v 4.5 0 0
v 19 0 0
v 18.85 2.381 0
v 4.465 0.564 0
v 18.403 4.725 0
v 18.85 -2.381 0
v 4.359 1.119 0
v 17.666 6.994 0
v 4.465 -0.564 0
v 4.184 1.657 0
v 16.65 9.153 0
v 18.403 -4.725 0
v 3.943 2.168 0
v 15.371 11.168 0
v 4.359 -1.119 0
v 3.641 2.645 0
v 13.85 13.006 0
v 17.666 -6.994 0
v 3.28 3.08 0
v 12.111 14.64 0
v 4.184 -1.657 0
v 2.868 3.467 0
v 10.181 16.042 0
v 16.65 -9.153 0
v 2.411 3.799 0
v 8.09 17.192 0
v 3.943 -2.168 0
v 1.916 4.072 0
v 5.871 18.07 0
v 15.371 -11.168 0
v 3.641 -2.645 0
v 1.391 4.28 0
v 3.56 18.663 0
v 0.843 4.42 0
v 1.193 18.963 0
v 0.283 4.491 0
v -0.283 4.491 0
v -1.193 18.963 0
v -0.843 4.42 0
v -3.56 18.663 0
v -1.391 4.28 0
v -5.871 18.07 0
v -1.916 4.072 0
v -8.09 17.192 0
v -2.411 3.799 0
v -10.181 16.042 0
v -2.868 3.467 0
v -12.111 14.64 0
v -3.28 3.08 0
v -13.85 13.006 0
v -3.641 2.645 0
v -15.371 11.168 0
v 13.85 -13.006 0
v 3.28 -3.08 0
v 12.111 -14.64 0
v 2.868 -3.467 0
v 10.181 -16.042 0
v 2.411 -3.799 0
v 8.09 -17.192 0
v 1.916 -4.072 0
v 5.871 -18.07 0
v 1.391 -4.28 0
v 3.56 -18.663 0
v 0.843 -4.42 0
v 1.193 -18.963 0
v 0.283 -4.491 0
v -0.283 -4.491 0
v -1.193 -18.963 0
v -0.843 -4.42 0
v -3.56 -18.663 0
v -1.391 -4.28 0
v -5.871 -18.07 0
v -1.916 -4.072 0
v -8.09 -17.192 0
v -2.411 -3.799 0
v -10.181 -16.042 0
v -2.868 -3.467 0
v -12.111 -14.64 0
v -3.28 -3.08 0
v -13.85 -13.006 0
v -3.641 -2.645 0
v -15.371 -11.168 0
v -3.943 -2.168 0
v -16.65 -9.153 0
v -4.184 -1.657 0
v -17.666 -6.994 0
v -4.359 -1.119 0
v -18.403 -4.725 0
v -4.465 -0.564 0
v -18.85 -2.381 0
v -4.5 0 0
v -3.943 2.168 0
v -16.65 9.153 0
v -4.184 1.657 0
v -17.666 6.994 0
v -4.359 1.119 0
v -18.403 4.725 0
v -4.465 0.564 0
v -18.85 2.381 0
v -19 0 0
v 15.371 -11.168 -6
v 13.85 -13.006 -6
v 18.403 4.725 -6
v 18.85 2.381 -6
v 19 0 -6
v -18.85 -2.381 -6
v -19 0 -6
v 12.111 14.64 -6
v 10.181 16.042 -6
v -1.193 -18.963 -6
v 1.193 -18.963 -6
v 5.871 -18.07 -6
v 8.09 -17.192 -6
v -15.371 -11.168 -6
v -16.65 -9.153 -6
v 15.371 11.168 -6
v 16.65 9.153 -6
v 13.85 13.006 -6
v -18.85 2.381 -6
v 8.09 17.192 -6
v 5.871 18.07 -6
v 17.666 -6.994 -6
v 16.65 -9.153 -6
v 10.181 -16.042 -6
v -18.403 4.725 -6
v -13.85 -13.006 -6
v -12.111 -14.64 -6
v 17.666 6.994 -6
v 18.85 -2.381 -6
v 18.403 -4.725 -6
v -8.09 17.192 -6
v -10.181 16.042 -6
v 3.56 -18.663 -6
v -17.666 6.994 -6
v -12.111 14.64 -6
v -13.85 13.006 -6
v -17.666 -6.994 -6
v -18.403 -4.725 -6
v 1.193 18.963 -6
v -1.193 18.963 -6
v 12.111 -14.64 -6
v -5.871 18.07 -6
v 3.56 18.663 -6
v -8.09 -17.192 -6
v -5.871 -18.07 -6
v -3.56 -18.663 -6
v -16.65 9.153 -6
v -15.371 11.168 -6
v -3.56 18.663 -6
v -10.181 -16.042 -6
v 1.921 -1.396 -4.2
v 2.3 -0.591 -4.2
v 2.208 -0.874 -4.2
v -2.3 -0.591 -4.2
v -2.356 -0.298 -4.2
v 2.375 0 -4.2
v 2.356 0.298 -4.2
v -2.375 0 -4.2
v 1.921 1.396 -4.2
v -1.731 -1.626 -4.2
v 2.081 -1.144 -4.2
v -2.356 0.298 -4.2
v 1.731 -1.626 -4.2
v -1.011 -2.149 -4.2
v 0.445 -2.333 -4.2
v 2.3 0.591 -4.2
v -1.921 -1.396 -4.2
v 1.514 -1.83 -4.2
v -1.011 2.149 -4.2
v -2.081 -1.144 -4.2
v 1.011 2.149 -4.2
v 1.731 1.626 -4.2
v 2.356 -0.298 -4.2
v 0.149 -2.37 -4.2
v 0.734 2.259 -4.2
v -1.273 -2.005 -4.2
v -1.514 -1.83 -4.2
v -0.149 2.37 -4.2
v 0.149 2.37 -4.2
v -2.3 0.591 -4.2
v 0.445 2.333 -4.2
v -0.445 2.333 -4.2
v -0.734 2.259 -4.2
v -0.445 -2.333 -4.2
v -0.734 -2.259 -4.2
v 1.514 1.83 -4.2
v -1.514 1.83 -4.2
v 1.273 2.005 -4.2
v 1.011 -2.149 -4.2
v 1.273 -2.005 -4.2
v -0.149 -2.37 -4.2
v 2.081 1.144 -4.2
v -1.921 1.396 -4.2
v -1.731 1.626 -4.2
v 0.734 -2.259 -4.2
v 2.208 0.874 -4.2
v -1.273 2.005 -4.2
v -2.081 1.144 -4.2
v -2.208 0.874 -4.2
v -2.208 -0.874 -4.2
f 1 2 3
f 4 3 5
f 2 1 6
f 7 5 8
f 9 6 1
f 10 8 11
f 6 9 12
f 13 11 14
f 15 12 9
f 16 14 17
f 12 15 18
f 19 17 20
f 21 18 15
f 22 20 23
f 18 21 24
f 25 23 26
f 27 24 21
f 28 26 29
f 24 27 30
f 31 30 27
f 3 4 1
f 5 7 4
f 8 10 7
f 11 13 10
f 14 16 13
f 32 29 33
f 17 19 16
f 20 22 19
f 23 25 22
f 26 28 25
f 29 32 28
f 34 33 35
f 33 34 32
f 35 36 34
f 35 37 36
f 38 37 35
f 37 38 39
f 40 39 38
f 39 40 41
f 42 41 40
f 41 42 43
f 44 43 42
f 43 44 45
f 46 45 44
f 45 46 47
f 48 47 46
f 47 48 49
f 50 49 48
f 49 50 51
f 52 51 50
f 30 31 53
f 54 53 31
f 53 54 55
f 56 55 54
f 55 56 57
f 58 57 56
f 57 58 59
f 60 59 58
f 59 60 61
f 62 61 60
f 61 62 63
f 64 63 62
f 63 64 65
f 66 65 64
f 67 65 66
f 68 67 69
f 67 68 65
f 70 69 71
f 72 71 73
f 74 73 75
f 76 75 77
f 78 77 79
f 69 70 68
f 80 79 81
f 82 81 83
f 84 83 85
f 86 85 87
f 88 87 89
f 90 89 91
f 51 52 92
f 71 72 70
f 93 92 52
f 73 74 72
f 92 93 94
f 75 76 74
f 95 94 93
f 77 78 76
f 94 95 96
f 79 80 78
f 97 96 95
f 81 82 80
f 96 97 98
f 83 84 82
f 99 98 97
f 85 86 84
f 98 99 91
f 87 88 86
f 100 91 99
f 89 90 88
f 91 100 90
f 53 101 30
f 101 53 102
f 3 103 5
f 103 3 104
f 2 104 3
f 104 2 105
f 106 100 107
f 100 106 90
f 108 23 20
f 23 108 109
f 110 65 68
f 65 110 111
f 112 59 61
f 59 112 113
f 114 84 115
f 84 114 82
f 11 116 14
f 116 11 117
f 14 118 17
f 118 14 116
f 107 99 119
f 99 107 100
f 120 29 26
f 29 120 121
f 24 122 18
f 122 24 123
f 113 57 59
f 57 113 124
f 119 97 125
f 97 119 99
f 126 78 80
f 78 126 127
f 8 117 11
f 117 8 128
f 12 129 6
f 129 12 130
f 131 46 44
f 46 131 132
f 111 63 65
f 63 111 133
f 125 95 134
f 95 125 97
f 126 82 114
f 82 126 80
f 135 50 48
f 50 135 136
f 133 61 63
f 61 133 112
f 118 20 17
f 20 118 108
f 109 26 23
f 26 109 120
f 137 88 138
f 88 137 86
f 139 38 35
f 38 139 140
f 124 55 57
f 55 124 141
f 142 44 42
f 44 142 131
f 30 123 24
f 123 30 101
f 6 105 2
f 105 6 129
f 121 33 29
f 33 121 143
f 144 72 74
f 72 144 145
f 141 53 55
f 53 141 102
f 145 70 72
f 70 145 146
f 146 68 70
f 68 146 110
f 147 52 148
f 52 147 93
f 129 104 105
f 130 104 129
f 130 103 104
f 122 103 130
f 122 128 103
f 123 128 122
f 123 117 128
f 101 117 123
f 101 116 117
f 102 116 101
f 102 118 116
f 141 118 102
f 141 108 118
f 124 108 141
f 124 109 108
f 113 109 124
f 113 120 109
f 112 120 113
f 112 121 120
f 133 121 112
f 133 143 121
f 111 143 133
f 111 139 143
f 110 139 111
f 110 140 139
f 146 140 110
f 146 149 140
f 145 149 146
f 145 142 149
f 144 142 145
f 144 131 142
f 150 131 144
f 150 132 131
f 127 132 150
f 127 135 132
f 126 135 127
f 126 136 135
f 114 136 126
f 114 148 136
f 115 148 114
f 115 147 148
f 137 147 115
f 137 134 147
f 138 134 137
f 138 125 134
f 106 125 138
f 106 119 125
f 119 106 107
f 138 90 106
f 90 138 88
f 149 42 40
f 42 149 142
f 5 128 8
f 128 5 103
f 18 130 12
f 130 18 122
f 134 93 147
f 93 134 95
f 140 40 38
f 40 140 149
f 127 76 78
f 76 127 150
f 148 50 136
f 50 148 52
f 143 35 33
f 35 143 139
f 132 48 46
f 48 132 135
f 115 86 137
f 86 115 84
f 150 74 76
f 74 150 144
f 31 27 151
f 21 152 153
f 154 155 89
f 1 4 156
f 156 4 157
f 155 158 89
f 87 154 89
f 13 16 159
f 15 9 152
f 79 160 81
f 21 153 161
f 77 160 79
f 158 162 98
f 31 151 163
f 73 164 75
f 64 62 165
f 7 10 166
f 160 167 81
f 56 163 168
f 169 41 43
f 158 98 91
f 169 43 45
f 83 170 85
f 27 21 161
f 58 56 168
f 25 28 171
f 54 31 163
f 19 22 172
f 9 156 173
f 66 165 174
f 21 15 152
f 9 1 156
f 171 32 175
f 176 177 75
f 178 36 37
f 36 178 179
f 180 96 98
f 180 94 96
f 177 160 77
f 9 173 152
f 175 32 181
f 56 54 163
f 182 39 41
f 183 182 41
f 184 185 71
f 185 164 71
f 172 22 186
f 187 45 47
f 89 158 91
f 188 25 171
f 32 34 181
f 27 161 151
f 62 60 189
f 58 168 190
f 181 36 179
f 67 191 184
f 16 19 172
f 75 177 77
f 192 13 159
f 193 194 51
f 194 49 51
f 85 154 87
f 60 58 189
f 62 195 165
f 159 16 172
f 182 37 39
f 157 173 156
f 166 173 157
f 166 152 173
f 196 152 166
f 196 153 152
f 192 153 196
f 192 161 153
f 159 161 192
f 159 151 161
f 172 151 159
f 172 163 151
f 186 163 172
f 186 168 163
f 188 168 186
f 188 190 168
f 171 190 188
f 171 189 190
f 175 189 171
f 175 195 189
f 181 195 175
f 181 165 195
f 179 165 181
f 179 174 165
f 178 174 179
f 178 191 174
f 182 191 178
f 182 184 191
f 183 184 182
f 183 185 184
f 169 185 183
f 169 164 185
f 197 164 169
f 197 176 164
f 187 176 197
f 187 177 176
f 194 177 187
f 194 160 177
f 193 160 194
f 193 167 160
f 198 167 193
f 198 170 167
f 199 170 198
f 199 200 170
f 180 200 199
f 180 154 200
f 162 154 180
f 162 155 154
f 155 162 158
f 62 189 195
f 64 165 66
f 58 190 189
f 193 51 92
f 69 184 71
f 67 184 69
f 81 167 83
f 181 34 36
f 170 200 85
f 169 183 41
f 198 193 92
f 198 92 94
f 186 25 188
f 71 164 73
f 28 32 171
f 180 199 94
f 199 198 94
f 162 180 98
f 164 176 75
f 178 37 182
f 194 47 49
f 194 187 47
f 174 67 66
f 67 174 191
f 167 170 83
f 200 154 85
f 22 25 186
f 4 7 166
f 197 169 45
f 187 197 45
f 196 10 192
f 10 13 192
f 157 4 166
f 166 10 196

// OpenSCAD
$fn = 50;


difference() {
	union() {
		translate(v = [0, 0, -3.0000000000]) {
			cylinder(h = 3, r = 10.0000000000);
		}
		translate(v = [0, 0, -6.0000000000]) {
			cylinder(h = 6, r = 19.0000000000);
		}
	}
	union() {
		translate(v = [0, 0, 0]) {
			rotate(a = [0, 0, 0]) {
				difference() {
					union() {
						#translate(v = [0, 0, -3.0000000000]) {
							cylinder(h = 3, r = 2.2500000000);
						}
						#translate(v = [0, 0, -4.2000000000]) {
							cylinder(h = 4.2000000000, r1 = 2.3750000000, r2 = 4.5000000000);
						}
						#translate(v = [0, 0, -3.0000000000]) {
							cylinder(h = 3, r = 2.3750000000);
						}
						#translate(v = [0, 0, -3.0000000000]) {
							cylinder(h = 3, r = 2.2500000000);
						}
					}
					union();
				}
			}
		}
	}
}
